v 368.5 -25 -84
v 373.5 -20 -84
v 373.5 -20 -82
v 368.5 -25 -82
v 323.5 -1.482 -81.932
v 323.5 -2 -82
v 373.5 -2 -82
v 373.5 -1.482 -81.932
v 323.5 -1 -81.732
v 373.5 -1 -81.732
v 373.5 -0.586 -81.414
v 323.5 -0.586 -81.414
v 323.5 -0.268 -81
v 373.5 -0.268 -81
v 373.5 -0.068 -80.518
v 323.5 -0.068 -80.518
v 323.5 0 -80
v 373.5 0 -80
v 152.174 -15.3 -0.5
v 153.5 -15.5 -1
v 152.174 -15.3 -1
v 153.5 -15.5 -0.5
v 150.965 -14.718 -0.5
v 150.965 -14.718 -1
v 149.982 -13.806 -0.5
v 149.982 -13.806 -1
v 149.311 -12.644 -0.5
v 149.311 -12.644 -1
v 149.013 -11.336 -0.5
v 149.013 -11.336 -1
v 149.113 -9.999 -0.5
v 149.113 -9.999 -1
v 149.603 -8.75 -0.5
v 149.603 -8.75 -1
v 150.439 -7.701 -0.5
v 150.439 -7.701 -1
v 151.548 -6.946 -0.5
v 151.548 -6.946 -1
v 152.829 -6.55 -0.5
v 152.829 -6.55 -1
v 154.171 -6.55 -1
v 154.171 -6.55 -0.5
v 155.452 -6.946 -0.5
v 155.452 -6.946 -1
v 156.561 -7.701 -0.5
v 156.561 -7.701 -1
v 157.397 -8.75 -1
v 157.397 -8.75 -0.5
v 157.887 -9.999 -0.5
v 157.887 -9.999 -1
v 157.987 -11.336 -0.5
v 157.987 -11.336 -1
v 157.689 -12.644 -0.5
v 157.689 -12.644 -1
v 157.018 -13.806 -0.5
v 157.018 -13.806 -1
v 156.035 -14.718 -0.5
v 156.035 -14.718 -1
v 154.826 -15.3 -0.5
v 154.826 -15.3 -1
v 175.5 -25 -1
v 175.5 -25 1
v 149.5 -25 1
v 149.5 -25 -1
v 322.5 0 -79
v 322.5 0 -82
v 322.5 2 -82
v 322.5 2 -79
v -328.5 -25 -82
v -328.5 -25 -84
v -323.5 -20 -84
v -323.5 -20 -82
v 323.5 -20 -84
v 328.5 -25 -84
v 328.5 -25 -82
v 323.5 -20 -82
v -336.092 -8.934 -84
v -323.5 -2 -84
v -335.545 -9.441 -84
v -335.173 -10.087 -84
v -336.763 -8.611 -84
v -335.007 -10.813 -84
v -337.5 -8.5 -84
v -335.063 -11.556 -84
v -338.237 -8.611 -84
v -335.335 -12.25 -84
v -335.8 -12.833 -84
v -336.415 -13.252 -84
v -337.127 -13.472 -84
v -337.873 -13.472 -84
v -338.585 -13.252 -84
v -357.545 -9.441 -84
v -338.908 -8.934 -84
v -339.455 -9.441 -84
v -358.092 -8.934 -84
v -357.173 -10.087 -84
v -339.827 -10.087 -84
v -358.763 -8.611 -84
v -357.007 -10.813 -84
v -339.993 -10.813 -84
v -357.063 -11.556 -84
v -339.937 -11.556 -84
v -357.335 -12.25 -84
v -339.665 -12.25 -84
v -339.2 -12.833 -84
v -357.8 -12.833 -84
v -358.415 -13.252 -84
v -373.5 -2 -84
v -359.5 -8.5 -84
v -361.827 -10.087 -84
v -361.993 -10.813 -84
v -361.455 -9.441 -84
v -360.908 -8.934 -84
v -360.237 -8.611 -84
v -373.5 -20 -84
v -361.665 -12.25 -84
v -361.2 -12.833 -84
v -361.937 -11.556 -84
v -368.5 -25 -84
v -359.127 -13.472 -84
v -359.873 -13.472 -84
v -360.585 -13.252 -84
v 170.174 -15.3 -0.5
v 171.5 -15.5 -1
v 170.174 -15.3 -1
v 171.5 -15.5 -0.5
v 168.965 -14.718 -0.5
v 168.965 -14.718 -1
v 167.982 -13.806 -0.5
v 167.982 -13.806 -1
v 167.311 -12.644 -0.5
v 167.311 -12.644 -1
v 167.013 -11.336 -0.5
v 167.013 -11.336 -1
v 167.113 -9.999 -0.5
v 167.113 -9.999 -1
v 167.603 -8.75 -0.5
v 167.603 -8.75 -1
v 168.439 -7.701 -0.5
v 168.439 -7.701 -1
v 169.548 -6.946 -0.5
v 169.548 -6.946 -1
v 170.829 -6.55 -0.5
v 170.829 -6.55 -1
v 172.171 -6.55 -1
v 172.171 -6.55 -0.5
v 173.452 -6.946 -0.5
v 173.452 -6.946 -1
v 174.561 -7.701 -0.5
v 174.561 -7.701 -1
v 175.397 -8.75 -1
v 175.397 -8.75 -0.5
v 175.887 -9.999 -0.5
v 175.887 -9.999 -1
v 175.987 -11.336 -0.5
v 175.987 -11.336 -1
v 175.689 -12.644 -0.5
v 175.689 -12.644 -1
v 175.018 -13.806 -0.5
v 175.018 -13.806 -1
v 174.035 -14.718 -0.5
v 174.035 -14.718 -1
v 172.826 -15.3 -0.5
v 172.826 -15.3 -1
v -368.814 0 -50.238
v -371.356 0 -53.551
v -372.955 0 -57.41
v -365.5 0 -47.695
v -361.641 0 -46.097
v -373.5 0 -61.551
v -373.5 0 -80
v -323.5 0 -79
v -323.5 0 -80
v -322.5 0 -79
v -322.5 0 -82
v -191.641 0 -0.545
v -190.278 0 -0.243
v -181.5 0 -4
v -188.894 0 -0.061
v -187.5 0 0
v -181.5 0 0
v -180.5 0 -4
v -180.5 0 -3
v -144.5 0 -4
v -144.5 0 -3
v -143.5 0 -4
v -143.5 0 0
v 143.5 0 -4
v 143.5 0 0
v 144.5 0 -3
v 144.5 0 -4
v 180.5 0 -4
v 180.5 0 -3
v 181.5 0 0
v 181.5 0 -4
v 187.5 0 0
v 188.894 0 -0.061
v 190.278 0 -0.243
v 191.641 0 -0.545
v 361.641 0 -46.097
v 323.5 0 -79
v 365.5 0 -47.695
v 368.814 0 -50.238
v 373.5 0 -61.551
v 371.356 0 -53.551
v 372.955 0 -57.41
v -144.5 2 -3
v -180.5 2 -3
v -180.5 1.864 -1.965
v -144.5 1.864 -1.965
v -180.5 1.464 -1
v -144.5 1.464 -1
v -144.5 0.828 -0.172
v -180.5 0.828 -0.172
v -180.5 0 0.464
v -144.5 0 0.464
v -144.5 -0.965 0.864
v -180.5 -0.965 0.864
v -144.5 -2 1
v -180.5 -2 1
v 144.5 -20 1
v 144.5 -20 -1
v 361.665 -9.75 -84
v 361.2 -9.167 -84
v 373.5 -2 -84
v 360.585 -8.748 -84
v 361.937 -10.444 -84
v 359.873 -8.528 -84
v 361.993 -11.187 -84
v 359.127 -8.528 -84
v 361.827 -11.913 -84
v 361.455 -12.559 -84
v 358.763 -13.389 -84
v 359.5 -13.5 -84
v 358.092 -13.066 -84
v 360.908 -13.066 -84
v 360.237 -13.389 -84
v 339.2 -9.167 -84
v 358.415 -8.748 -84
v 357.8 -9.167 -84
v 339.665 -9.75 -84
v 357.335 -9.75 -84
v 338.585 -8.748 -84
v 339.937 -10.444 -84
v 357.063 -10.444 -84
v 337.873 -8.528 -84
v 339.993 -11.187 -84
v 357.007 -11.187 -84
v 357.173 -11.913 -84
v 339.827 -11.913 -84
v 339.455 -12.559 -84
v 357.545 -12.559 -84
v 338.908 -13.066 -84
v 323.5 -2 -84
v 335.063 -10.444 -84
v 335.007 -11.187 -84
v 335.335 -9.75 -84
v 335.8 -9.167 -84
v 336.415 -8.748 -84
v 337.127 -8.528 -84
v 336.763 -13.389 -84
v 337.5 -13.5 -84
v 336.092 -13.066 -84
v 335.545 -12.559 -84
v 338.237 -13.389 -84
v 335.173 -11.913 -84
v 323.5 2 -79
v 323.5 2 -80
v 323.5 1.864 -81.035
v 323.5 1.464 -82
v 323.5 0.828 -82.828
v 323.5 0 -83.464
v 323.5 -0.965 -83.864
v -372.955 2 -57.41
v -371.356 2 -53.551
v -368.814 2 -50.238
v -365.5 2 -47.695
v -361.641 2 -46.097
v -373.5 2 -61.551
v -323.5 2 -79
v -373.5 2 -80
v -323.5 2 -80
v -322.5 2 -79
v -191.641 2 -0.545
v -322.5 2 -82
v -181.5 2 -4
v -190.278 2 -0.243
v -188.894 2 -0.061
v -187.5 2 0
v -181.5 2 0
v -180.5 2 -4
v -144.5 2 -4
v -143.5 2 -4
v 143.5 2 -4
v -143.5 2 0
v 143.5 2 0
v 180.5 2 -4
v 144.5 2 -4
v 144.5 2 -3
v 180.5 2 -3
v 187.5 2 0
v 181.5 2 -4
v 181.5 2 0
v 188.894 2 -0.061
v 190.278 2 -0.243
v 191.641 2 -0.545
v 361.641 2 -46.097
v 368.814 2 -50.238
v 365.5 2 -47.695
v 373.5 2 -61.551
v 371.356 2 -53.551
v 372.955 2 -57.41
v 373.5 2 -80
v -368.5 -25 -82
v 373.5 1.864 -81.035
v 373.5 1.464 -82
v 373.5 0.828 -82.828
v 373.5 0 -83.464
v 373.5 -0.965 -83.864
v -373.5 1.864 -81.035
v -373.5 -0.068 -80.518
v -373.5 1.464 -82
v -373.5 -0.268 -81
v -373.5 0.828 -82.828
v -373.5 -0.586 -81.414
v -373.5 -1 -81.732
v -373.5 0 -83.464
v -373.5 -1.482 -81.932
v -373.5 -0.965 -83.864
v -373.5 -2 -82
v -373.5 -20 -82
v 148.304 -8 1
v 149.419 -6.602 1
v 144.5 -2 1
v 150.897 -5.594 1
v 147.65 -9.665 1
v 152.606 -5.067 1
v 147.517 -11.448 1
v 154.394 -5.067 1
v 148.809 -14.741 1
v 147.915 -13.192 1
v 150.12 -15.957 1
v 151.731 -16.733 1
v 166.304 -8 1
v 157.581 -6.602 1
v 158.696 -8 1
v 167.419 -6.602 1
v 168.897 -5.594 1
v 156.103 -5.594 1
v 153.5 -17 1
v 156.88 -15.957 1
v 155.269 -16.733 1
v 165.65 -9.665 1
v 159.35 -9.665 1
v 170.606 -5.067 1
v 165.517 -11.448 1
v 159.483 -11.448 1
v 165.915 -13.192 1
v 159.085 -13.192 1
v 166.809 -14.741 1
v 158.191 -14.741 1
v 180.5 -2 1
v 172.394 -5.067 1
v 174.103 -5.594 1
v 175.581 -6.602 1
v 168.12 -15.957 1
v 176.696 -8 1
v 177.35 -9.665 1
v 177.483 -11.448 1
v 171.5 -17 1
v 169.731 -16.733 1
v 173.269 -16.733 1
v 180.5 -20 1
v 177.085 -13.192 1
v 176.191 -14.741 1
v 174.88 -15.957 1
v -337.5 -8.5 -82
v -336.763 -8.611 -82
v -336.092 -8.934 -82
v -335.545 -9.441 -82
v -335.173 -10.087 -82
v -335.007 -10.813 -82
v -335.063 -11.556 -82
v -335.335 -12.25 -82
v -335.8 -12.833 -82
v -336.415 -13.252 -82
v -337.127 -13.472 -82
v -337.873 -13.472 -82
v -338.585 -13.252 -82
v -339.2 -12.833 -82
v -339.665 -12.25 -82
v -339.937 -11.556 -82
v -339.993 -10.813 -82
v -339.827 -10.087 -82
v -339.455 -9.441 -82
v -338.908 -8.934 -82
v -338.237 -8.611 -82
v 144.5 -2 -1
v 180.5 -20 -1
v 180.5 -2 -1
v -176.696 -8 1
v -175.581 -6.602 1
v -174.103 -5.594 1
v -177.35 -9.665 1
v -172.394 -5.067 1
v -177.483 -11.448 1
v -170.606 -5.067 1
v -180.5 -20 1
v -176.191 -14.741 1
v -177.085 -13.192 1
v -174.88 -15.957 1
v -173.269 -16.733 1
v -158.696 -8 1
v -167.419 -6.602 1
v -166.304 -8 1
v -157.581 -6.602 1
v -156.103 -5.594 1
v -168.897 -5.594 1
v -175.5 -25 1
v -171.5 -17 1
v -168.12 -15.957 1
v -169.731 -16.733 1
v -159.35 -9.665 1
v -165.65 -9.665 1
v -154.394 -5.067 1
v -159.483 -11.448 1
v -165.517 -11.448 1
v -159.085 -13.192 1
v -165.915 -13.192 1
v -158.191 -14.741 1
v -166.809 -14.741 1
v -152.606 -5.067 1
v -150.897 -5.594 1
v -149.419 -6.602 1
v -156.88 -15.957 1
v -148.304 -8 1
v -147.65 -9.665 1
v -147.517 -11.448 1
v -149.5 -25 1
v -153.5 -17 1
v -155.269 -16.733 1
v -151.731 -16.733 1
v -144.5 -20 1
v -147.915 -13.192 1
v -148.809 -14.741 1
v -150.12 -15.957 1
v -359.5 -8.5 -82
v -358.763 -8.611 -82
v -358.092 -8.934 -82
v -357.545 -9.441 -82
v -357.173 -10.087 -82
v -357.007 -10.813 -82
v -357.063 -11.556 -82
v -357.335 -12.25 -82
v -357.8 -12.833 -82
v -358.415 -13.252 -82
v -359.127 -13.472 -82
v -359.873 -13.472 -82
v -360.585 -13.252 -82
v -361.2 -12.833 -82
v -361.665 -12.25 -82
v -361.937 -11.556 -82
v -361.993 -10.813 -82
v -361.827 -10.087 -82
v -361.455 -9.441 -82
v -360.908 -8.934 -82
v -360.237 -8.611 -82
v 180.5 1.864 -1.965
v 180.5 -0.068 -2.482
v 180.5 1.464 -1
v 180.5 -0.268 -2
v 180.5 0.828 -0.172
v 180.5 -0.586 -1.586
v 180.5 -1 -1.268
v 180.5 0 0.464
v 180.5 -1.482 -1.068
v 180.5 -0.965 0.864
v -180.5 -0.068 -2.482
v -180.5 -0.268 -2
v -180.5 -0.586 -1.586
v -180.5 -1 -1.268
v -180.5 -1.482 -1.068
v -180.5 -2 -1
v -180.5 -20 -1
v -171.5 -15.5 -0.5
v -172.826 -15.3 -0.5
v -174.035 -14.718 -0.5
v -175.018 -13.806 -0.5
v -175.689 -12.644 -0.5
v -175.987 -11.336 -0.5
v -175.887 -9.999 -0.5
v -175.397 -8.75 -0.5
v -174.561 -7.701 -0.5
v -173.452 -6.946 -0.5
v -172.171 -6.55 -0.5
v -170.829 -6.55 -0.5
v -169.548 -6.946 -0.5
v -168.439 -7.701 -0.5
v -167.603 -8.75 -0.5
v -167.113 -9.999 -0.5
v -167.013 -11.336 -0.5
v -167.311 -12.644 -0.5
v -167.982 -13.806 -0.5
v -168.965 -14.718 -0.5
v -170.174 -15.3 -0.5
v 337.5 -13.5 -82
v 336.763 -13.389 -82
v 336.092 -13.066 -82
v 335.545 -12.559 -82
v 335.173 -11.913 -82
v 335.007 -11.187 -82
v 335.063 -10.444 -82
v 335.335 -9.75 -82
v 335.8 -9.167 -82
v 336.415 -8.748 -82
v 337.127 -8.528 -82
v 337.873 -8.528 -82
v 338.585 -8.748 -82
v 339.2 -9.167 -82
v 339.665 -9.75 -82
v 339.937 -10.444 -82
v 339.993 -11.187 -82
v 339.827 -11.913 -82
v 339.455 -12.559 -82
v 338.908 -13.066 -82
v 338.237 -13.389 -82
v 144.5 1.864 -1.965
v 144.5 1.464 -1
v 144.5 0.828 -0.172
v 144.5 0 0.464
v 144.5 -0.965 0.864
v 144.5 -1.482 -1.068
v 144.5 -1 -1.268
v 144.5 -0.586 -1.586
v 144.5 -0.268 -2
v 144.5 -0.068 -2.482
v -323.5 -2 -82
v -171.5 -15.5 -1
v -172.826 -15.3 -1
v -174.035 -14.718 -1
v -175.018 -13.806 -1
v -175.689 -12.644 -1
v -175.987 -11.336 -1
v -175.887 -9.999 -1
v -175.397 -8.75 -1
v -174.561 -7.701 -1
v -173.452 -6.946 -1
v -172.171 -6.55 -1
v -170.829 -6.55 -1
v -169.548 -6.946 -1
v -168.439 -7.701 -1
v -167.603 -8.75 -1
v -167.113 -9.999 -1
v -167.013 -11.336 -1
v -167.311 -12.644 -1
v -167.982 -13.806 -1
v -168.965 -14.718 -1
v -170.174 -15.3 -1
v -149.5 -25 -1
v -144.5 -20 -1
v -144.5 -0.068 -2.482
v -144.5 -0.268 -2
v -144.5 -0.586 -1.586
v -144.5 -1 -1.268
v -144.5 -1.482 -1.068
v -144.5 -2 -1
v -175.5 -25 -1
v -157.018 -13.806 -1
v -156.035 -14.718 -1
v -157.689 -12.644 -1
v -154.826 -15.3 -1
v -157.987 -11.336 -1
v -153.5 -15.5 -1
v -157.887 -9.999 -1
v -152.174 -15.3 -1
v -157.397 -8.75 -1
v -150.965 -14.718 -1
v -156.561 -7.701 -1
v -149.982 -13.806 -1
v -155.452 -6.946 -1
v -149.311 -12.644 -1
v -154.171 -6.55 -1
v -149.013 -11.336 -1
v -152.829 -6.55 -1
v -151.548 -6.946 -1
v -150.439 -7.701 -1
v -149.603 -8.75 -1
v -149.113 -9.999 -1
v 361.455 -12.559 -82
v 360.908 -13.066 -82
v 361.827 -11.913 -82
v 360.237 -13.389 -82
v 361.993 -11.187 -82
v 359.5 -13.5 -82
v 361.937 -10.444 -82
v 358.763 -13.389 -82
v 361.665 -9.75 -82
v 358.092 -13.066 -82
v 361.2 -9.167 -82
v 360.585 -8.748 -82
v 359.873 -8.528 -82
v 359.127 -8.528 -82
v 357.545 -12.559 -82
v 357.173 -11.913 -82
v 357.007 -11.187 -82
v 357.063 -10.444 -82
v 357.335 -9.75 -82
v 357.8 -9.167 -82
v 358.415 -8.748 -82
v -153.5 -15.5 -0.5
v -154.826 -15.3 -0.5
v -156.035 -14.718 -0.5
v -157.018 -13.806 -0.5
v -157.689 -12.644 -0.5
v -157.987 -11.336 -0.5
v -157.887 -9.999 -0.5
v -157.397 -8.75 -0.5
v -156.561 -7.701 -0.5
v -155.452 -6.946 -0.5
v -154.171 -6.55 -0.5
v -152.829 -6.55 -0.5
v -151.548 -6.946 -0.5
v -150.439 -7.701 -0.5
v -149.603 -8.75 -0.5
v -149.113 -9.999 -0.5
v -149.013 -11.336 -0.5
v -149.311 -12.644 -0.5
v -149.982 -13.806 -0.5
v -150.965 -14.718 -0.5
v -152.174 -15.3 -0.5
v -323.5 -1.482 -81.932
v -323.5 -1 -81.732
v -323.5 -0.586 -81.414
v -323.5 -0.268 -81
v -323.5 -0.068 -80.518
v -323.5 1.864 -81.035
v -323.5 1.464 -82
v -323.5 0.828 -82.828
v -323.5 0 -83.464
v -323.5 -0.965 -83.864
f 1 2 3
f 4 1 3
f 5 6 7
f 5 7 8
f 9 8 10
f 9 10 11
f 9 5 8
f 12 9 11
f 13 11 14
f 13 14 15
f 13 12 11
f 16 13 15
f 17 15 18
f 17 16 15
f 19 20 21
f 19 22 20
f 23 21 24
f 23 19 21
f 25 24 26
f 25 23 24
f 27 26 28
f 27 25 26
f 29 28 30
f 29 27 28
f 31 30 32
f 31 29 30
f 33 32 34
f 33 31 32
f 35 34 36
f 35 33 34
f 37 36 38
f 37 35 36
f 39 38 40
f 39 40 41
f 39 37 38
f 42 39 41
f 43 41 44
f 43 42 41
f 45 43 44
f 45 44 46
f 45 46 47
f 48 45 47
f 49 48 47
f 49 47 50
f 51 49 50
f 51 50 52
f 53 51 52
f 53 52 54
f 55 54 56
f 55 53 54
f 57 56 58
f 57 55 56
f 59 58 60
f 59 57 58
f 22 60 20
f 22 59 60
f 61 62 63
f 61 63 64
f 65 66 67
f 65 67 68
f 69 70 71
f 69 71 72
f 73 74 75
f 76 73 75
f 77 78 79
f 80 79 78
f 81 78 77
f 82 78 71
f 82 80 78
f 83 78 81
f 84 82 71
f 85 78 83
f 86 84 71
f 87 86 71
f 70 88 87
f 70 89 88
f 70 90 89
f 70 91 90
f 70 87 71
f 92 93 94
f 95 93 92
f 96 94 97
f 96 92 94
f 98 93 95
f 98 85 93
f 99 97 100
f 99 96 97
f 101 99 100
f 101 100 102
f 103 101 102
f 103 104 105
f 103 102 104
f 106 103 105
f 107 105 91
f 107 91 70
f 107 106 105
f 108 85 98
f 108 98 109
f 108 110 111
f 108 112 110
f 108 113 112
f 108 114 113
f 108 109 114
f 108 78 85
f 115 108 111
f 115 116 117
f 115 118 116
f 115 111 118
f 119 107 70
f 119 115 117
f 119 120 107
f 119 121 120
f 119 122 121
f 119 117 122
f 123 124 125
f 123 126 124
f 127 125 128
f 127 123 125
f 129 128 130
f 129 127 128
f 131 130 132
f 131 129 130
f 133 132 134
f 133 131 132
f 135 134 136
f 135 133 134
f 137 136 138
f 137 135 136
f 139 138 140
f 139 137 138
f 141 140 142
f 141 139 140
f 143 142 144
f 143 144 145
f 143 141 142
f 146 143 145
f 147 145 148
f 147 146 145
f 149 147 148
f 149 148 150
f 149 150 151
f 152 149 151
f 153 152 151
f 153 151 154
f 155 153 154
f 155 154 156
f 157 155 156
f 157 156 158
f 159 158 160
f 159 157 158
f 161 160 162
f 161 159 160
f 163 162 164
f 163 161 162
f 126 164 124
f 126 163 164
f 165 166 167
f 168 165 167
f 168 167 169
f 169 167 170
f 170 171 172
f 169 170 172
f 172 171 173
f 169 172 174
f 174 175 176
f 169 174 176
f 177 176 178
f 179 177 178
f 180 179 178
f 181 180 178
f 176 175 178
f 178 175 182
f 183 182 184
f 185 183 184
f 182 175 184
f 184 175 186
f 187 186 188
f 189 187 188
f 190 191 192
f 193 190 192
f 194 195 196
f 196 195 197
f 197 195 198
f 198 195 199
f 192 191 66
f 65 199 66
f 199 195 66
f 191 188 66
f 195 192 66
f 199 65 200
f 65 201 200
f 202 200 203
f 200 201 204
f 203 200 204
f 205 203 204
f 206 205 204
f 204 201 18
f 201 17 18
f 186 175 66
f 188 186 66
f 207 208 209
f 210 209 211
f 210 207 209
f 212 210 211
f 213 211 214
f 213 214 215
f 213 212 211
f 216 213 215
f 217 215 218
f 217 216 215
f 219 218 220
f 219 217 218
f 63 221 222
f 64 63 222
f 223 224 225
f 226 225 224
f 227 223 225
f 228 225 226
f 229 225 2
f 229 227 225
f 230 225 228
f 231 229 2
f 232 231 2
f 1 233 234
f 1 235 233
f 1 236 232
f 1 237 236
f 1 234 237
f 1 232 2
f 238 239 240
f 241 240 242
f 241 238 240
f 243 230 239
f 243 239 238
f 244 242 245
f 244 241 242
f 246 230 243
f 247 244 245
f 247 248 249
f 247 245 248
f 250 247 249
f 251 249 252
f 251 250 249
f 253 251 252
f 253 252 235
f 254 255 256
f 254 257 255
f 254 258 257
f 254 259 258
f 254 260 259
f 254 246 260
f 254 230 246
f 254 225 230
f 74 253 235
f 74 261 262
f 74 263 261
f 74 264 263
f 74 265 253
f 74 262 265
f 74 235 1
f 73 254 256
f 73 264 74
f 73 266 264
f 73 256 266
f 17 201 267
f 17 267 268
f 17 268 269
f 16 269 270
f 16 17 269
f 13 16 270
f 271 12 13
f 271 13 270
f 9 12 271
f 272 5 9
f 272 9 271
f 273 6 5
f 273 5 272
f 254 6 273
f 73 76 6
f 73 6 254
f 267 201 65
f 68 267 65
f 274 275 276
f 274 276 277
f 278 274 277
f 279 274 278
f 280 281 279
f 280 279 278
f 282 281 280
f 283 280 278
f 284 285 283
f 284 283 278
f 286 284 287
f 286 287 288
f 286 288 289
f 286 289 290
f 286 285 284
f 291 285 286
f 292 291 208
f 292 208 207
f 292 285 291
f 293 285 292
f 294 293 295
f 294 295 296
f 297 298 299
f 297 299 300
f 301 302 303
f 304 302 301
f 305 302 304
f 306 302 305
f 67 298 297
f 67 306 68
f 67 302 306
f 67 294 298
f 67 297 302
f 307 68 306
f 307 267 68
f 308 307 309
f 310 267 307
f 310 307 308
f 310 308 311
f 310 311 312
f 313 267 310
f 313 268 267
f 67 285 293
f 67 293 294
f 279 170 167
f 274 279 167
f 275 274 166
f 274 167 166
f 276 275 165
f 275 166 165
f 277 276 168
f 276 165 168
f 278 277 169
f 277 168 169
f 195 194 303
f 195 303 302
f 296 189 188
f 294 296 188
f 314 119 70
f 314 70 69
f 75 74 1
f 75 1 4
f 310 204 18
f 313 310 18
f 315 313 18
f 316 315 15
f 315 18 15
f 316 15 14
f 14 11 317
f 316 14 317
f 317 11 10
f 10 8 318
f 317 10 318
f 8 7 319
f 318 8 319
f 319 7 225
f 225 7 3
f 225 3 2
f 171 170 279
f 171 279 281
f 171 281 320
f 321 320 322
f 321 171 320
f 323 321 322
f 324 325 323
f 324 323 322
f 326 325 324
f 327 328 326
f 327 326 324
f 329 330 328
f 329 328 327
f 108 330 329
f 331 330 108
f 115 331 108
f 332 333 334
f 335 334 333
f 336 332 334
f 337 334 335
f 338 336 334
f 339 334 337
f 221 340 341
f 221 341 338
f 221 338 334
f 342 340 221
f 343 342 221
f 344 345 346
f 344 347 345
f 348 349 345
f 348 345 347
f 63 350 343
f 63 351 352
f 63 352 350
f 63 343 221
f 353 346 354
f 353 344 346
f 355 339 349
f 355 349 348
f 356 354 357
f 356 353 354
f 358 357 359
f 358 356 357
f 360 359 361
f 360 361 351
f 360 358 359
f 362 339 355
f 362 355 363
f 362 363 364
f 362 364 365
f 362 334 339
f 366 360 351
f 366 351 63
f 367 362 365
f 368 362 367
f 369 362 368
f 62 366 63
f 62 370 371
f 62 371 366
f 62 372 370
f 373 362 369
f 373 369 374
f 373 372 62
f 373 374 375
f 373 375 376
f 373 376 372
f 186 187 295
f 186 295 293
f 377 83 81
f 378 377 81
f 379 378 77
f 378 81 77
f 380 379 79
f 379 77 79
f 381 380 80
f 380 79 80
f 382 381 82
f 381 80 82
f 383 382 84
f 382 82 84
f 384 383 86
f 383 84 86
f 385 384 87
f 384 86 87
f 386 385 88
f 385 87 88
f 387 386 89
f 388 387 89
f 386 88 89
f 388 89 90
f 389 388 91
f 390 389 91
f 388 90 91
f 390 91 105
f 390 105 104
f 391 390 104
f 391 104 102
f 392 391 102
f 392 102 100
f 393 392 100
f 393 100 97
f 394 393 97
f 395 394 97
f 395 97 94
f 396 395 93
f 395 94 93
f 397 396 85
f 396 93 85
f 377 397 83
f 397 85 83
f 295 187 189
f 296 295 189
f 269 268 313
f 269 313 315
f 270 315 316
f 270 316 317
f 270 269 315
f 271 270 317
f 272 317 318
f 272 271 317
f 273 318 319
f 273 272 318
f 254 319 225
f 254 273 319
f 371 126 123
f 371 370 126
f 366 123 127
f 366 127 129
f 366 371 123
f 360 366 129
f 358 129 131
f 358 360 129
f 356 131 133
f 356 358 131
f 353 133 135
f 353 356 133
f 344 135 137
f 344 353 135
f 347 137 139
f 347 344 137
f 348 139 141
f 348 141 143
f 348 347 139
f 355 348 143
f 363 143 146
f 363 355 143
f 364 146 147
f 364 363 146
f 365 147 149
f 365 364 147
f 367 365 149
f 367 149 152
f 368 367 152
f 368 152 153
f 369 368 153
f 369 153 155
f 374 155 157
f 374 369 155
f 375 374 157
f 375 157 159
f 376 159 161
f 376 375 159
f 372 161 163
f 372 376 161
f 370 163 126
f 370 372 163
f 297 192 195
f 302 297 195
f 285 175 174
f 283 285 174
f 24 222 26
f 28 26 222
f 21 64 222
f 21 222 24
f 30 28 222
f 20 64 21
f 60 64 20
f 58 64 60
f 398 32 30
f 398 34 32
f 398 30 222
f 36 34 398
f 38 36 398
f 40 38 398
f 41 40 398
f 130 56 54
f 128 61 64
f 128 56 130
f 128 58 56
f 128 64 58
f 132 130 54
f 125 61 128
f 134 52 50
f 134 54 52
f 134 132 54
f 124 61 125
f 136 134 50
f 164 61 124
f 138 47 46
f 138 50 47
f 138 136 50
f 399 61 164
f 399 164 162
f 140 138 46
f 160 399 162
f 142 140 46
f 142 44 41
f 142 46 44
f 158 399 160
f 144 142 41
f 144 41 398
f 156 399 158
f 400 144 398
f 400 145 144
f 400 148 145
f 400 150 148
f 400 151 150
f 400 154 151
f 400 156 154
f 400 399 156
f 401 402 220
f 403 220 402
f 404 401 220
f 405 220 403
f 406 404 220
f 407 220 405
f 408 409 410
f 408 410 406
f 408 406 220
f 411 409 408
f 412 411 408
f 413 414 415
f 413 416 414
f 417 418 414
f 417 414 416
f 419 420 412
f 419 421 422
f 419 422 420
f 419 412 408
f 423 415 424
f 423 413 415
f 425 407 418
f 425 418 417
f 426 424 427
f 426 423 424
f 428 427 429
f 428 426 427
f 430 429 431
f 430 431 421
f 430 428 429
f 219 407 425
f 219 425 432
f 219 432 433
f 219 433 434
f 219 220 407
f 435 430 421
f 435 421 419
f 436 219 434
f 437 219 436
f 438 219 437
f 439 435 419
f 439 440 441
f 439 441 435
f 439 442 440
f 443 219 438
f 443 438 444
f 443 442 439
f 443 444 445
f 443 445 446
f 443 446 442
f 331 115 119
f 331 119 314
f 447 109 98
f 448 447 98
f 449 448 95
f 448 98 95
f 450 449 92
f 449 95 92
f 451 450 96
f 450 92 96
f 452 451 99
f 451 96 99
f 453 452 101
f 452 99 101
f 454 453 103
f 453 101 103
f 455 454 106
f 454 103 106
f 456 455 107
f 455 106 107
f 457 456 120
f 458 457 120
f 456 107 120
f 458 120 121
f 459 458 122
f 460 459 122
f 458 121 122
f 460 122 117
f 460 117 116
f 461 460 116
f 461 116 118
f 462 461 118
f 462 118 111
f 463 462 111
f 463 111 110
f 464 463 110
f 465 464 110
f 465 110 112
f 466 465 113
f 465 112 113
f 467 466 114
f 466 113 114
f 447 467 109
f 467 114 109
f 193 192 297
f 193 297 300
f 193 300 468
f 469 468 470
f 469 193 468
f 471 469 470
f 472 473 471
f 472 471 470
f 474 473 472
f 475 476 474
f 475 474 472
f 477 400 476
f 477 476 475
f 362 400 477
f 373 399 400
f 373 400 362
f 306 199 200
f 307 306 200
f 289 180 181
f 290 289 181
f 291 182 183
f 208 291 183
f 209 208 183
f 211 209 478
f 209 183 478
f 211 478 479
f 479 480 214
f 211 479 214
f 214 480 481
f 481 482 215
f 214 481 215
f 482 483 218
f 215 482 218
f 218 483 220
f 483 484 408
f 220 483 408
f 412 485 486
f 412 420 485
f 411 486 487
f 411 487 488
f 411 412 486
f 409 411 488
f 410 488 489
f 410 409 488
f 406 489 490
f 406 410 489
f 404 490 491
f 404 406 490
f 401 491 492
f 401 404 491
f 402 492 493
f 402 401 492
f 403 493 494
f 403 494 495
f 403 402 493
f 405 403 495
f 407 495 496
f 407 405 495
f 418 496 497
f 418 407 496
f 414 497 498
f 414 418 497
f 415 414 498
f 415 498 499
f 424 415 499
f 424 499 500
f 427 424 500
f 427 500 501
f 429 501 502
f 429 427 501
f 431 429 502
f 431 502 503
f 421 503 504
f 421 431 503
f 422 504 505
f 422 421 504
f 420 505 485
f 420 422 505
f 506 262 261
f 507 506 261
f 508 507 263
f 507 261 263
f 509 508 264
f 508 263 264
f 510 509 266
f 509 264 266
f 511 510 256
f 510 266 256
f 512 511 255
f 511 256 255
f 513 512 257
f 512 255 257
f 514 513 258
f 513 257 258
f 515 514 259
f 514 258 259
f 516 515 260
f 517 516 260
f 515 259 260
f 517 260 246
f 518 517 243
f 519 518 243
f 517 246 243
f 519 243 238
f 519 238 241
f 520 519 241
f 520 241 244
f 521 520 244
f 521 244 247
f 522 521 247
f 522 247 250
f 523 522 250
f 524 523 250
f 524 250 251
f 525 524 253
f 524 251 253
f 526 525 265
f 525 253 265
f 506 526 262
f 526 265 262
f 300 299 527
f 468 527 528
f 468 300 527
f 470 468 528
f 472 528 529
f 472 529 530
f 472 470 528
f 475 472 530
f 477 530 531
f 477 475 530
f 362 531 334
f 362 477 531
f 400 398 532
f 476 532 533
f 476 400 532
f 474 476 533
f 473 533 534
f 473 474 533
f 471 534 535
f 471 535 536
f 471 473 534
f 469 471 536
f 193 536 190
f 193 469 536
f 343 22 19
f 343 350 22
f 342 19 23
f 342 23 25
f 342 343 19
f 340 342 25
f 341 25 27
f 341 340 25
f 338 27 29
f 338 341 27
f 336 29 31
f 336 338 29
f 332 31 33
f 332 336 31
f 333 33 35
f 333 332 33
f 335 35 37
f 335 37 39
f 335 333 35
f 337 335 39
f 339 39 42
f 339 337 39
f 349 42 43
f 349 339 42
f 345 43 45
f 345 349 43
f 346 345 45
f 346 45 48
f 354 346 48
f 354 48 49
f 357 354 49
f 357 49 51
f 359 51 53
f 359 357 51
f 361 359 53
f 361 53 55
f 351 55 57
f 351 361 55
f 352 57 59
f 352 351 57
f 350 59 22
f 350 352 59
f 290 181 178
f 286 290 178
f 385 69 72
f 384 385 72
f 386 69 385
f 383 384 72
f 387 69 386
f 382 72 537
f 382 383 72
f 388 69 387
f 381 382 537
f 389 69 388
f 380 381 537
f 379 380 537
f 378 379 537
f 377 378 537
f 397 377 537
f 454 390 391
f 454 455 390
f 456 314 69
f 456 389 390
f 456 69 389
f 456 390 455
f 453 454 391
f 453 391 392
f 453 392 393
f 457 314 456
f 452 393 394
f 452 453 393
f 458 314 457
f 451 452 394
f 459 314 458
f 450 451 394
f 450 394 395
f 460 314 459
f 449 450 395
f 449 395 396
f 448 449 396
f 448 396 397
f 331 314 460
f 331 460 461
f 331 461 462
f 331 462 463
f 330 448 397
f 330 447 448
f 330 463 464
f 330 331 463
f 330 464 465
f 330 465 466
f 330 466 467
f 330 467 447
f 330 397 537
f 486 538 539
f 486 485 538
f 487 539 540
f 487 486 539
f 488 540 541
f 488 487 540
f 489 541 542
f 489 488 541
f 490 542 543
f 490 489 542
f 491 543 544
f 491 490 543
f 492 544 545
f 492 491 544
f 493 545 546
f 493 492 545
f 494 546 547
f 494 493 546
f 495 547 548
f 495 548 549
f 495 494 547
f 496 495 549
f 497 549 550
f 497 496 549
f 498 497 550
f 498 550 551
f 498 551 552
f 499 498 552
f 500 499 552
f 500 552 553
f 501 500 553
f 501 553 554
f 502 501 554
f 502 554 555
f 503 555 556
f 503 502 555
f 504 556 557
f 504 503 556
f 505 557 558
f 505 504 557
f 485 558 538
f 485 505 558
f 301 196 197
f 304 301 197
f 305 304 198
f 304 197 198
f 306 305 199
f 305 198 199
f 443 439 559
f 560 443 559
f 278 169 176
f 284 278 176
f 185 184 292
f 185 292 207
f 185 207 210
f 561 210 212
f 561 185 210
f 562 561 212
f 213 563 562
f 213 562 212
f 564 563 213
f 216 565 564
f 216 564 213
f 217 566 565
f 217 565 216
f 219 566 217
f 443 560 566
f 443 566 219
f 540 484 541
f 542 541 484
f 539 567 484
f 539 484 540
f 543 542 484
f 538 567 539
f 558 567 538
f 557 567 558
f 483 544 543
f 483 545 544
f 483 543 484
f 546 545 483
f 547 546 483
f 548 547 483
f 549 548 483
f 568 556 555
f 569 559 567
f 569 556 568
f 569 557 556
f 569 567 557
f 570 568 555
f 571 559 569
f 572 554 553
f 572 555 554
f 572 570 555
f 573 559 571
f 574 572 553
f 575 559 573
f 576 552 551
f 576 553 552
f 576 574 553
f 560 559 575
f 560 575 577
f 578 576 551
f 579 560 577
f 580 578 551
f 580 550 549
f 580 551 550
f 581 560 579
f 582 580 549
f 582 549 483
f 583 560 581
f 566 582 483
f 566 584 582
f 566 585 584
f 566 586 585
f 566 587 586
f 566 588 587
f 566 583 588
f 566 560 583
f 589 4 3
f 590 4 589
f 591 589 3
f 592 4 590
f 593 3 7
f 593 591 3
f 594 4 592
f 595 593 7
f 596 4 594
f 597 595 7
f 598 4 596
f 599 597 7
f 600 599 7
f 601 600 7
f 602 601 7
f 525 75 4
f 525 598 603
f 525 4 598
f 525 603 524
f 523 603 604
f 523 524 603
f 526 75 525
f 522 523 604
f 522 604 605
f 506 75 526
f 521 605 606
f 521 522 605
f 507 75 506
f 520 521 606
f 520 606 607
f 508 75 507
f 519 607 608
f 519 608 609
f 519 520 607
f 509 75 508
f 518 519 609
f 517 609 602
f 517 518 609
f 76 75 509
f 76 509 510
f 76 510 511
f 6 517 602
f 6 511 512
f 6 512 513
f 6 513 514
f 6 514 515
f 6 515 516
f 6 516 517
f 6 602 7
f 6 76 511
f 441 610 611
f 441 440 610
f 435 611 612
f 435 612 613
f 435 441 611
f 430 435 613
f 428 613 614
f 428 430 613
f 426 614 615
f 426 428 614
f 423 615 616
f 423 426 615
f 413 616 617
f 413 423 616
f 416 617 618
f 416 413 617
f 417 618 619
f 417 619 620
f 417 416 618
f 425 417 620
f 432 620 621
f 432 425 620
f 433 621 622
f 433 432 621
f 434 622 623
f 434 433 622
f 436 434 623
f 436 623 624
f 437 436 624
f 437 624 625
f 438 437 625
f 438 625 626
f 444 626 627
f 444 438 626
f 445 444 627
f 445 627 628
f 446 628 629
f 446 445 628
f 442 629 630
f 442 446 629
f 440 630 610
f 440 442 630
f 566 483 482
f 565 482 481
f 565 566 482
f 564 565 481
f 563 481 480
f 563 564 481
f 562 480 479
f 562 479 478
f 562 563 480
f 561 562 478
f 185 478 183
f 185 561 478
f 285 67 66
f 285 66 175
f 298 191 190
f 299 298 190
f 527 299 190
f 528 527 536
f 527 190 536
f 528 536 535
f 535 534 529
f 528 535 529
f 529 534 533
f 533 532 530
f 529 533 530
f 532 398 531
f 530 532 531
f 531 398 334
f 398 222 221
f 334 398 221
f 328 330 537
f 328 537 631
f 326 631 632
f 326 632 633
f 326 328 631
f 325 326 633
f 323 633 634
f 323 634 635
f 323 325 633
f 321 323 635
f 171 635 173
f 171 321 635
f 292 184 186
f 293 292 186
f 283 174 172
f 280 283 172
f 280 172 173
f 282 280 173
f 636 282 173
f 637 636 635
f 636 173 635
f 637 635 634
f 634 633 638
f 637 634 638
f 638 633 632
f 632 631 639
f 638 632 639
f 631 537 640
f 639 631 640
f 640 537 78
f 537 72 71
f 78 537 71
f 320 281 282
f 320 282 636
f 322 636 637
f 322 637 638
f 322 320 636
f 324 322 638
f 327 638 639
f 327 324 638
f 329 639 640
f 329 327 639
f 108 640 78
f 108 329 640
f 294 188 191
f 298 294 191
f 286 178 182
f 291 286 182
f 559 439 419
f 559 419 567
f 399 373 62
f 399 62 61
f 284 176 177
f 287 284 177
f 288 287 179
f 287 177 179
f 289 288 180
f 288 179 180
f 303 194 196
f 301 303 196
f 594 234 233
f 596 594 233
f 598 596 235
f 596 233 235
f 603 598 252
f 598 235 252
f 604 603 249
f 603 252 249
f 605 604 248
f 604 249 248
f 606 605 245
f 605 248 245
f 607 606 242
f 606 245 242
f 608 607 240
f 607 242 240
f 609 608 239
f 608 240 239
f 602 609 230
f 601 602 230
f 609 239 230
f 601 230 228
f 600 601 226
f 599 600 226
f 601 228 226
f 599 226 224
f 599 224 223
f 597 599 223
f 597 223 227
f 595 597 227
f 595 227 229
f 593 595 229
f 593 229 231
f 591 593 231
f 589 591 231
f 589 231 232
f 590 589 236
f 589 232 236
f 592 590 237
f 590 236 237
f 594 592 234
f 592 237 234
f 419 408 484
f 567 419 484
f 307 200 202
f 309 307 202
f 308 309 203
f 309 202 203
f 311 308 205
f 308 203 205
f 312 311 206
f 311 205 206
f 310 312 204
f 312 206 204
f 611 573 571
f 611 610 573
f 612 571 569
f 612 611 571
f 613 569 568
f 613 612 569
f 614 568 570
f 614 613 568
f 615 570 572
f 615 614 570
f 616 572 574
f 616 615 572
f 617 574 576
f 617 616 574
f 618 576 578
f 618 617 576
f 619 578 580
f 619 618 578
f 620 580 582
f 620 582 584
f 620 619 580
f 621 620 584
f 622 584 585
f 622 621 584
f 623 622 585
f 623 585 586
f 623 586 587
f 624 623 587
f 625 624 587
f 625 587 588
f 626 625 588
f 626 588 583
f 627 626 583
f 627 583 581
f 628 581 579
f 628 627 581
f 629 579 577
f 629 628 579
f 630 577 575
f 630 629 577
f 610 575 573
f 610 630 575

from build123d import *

# Parameters (mm, degrees)
SM_BASE_FLANGE_1_DEPTH            = 2
SM_EDGE_FLANGE_1_STRIP_W          = 12
SM_EDGE_FLANGE_1_STRIP_H          = 2
SM_EDGE_FLANGE_1_STRIP_CUT_DEPTH  = 50
SM_EDGE_FLANGE_1_RELIEF_W         = 13
SM_EDGE_FLANGE_1_RELIEF_H         = 1
SM_EDGE_FLANGE_1_RELIEF_CUT_DEPTH = 2
SM_EDGE_FLANGE_1_DEPTH            = 50
SM_EDGE_FLANGE_2_STRIP_W          = 12
SM_EDGE_FLANGE_2_STRIP_H          = 2
SM_EDGE_FLANGE_2_STRIP_CUT_DEPTH  = 50
SM_EDGE_FLANGE_2_RELIEF_W         = 13
SM_EDGE_FLANGE_2_RELIEF_H         = 1
SM_EDGE_FLANGE_2_RELIEF_CUT_DEPTH = 2
SM_EDGE_FLANGE_2_DEPTH            = 50
SM_EDGE_FLANGE_3_STRIP_W          = 13
SM_EDGE_FLANGE_3_STRIP_H          = 2
SM_EDGE_FLANGE_3_STRIP_CUT_DEPTH  = 36
SM_EDGE_FLANGE_3_RELIEF_W         = 14
SM_EDGE_FLANGE_3_RELIEF_H         = 1
SM_EDGE_FLANGE_3_RELIEF_CUT_DEPTH = 2
SM_EDGE_FLANGE_3_DEPTH            = 36
SM_EDGE_FLANGE_4_STRIP_W          = 13
SM_EDGE_FLANGE_4_STRIP_H          = 2
SM_EDGE_FLANGE_4_STRIP_CUT_DEPTH  = 36
SM_EDGE_FLANGE_4_RELIEF_W         = 14
SM_EDGE_FLANGE_4_RELIEF_H         = 1
SM_EDGE_FLANGE_4_RELIEF_CUT_DEPTH = 2
SM_EDGE_FLANGE_4_DEPTH            = 36
CHAMFER_1_SIZE                    = 5
HOLE_WIZARD_M61_AT_2_COUNT        = 2
HOLE_WIZARD_M61_AT_2_PITCH        = 18
HOLE_WIZARD_M61_AT_3_COUNT        = 2
HOLE_WIZARD_M61_AT_3_PITCH        = 325
HOLE_WIZARD_M61_AT_4_COUNT        = 2
HOLE_WIZARD_M61_AT_4_PITCH        = 343
SKETCH_20_R                       = 2.5
CUT_EXTRUDE_1_DEPTH               = 2
SKETCH_21_W                       = 645
SKETCH_21_H                       = 2
CUT_EXTRUDE_2_DEPTH               = 2


# Sheet-metal steps are written as plain solids
with BuildPart() as part:
    # Sketch 1 → Базовая кромка1 (new body)
    with BuildSketch(Plane(origin=(0, 0, 0), x_dir=(1, 0, 0), z_dir=(0, 1, 0))):
        with BuildLine():
            Line((-187.5, 0), (187.5, 0))
            ThreePointArc((187.5, 0), (189.588419076, 0.136882218), (191.641104722, 0.545186779))
            Line((191.641104722, 0.545186779), (361.641104722, 46.096549493))
            ThreePointArc((361.641104722, 46.096549493), (370.193653445, 51.811179849), (373.5, 61.551362713))
            Line((373.5, 61.551362713), (373.5, 84))
            Line((373.5, 84), (0, 84))
            Line((0, 84), (-373.5, 84))
            Line((-373.5, 84), (-373.5, 61.551362713))
            ThreePointArc((-373.5, 61.551362713), (-370.193653445, 51.811179849), (-361.641104722, 46.096549493))
            Line((-361.641104722, 46.096549493), (-191.641104722, 0.545186779))
            ThreePointArc((-191.641104722, 0.545186779), (-189.588419076, 0.136882218), (-187.5, 0))
        make_face()
    extrude(amount=SM_BASE_FLANGE_1_DEPTH)

    # Ребро-кромка1 strip (across the edge) → Ребро-кромка1 strip cut (cut)
    with BuildSketch(Plane(origin=(323.5, 0, -84), x_dir=(0, 0, 1), z_dir=(1, 0, 0))):
        with Locations((-2, -1)):
            Rectangle(SM_EDGE_FLANGE_1_STRIP_W, SM_EDGE_FLANGE_1_STRIP_H)
    extrude(amount=SM_EDGE_FLANGE_1_STRIP_CUT_DEPTH, mode=Mode.SUBTRACT)

    # Ребро-кромка1 relief (on the sheet) → Ребро-кромка1 relief cut (cut)
    with BuildSketch(Plane(origin=(323.5, 0, -80), x_dir=(0, 0, 1), z_dir=(0, -1, 0))):
        with Locations((-5.5, 0.5)):
            Rectangle(SM_EDGE_FLANGE_1_RELIEF_W, SM_EDGE_FLANGE_1_RELIEF_H)
    extrude(amount=-SM_EDGE_FLANGE_1_RELIEF_CUT_DEPTH, mode=Mode.SUBTRACT)

    # Ребро-кромка1 section (across the edge) → Ребро-кромка1 (add)
    with BuildSketch(Plane(origin=(323.5, 0, -84), x_dir=(0, 0, 1), z_dir=(1, 0, 0))):
        with BuildLine():
            Line((0, 2), (0, 25))
            Line((0, 25), (2, 25))
            Line((2, 25), (2, 2))
            ThreePointArc((2, 2), (2.585786438, 0.585786438), (4, 0))
            Line((4, 0), (4, -2))
            ThreePointArc((4, -2), (1.171572875, -0.828427125), (0, 2))
        make_face()
    extrude(amount=SM_EDGE_FLANGE_1_DEPTH)

    # Ребро-кромка2 strip (across the edge) → Ребро-кромка2 strip cut (cut)
    with BuildSketch(Plane(origin=(-373.5, 0, -84), x_dir=(0, 0, 1), z_dir=(1, 0, 0))):
        with Locations((-2, -1)):
            Rectangle(SM_EDGE_FLANGE_2_STRIP_W, SM_EDGE_FLANGE_2_STRIP_H)
    extrude(amount=SM_EDGE_FLANGE_2_STRIP_CUT_DEPTH, mode=Mode.SUBTRACT)

    # Ребро-кромка2 relief (on the sheet) → Ребро-кромка2 relief cut (cut)
    with BuildSketch(Plane(origin=(-373.5, 0, -80), x_dir=(0, 0, 1), z_dir=(0, -1, 0))):
        with Locations((-5.5, -50.5)):
            Rectangle(SM_EDGE_FLANGE_2_RELIEF_W, SM_EDGE_FLANGE_2_RELIEF_H)
    extrude(amount=-SM_EDGE_FLANGE_2_RELIEF_CUT_DEPTH, mode=Mode.SUBTRACT)

    # Ребро-кромка2 section (across the edge) → Ребро-кромка2 (add)
    with BuildSketch(Plane(origin=(-373.5, 0, -84), x_dir=(0, 0, 1), z_dir=(1, 0, 0))):
        with BuildLine():
            Line((0, 2), (0, 25))
            Line((0, 25), (2, 25))
            Line((2, 25), (2, 2))
            ThreePointArc((2, 2), (2.585786438, 0.585786438), (4, 0))
            Line((4, 0), (4, -2))
            ThreePointArc((4, -2), (1.171572875, -0.828427125), (0, 2))
        make_face()
    extrude(amount=SM_EDGE_FLANGE_2_DEPTH)

    # Ребро-кромка3 strip (across the edge) → Ребро-кромка3 strip cut (cut)
    with BuildSketch(Plane(origin=(-144.5, 0, 1), x_dir=(0, 0, -1), z_dir=(-1, 0, 0))):
        with Locations((-2.5, -1)):
            Rectangle(SM_EDGE_FLANGE_3_STRIP_W, SM_EDGE_FLANGE_3_STRIP_H)
    extrude(amount=SM_EDGE_FLANGE_3_STRIP_CUT_DEPTH, mode=Mode.SUBTRACT)

    # Ребро-кромка3 relief (on the sheet) → Ребро-кромка3 relief cut (cut)
    with BuildSketch(Plane(origin=(-144.5, 0, -3), x_dir=(0, 0, -1), z_dir=(0, -1, 0))):
        with Locations((-6, 0.5)):
            Rectangle(SM_EDGE_FLANGE_3_RELIEF_W, SM_EDGE_FLANGE_3_RELIEF_H)
        with Locations((-6, -36.5)):
            Rectangle(SM_EDGE_FLANGE_3_RELIEF_W, SM_EDGE_FLANGE_3_RELIEF_H)
    extrude(amount=-SM_EDGE_FLANGE_3_RELIEF_CUT_DEPTH, mode=Mode.SUBTRACT)

    # Ребро-кромка3 section (across the edge) → Ребро-кромка3 (add)
    with BuildSketch(Plane(origin=(-144.5, 0, 1), x_dir=(0, 0, -1), z_dir=(-1, 0, 0))):
        with BuildLine():
            Line((0, 2), (0, 25))
            Line((0, 25), (2, 25))
            Line((2, 25), (2, 2))
            ThreePointArc((2, 2), (2.585786438, 0.585786438), (4, 0))
            Line((4, 0), (4, -2))
            ThreePointArc((4, -2), (1.171572875, -0.828427125), (0, 2))
        make_face()
    extrude(amount=SM_EDGE_FLANGE_3_DEPTH)

    # Ребро-кромка4 strip (across the edge) → Ребро-кромка4 strip cut (cut)
    with BuildSketch(Plane(origin=(180.5, 0, 1), x_dir=(0, 0, -1), z_dir=(-1, 0, 0))):
        with Locations((-2.5, -1)):
            Rectangle(SM_EDGE_FLANGE_4_STRIP_W, SM_EDGE_FLANGE_4_STRIP_H)
    extrude(amount=SM_EDGE_FLANGE_4_STRIP_CUT_DEPTH, mode=Mode.SUBTRACT)

    # Ребро-кромка4 relief (on the sheet) → Ребро-кромка4 relief cut (cut)
    with BuildSketch(Plane(origin=(180.5, 0, -3), x_dir=(0, 0, -1), z_dir=(0, -1, 0))):
        with Locations((-6, 0.5)):
            Rectangle(SM_EDGE_FLANGE_4_RELIEF_W, SM_EDGE_FLANGE_4_RELIEF_H)
        with Locations((-6, -36.5)):
            Rectangle(SM_EDGE_FLANGE_4_RELIEF_W, SM_EDGE_FLANGE_4_RELIEF_H)
    extrude(amount=-SM_EDGE_FLANGE_4_RELIEF_CUT_DEPTH, mode=Mode.SUBTRACT)

    # Ребро-кромка4 section (across the edge) → Ребро-кромка4 (add)
    with BuildSketch(Plane(origin=(180.5, 0, 1), x_dir=(0, 0, -1), z_dir=(-1, 0, 0))):
        with BuildLine():
            Line((0, 2), (0, 25))
            Line((0, 25), (2, 25))
            Line((2, 25), (2, 2))
            ThreePointArc((2, 2), (2.585786438, 0.585786438), (4, 0))
            Line((4, 0), (4, -2))
            ThreePointArc((4, -2), (1.171572875, -0.828427125), (0, 2))
        make_face()
    extrude(amount=SM_EDGE_FLANGE_4_DEPTH)

    # Фаска1
    chamfer_1_edges = [part.edges().sort_by_distance(p)[0] for p in [
        (-373.5, -25, -83),
        (-323.5, -25, -83),
        (-144.5, -25, 0),
        (-180.5, -25, 0),
        (180.5, -25, 0),
        (144.5, -25, 0),
        (323.5, -25, -83),
        (373.5, -25, -83),
    ]]
    chamfer(chamfer_1_edges, length=CHAMFER_1_SIZE)

    # Эскиз18 → Зенковка для винта с потайной головкой M61 (revolve, cut)
    with BuildSketch(Plane(origin=(-171.5, -11, 1), x_dir=(0, -1, 0), z_dir=(1, 0, 0))):
        Polygon((0, 0), (0, 2), (4.5, 2), (4.5, 1.5), (6, 0), align=None)
    hole_wizard_m61 = revolve(axis=Axis((-171.5, -11, 7.35), (0, 0, -1)), mode=Mode.SUBTRACT)

    # Зенковка для винта с потайной головкой M61 at 2: Зенковка для винта с потайной головкой M61 ×2
    with Locations(*[(i * HOLE_WIZARD_M61_AT_2_PITCH, 0, 0) for i in range(1, HOLE_WIZARD_M61_AT_2_COUNT)]):
        add(hole_wizard_m61, mode=Mode.SUBTRACT)

    # Зенковка для винта с потайной головкой M61 at 3: Зенковка для винта с потайной головкой M61 ×2
    with Locations(*[(i * HOLE_WIZARD_M61_AT_3_PITCH, 0, 0) for i in range(1, HOLE_WIZARD_M61_AT_3_COUNT)]):
        add(hole_wizard_m61, mode=Mode.SUBTRACT)

    # Зенковка для винта с потайной головкой M61 at 4: Зенковка для винта с потайной головкой M61 ×2
    with Locations(*[(i * HOLE_WIZARD_M61_AT_4_PITCH, 0, 0) for i in range(1, HOLE_WIZARD_M61_AT_4_COUNT)]):
        add(hole_wizard_m61, mode=Mode.SUBTRACT)

    # Эскиз20 → Вытянуть1 (cut)
    with BuildSketch(Plane(origin=(0, 0, -84), x_dir=(-1, 0, 0), z_dir=(0, 0, -1))):
        with Locations(Location((337.5, -11, 0), (0, 0, 90))):
            Circle(SKETCH_20_R)
        with Locations(Location((359.5, -11, 0), (0, 0, 90))):
            Circle(SKETCH_20_R)
        with Locations(Location((-359.5, -11, 0), (0, 0, 270))):
            Circle(SKETCH_20_R)
        with Locations(Location((-337.5, -11, 0), (0, 0, 270))):
            Circle(SKETCH_20_R)
    extrude(amount=-CUT_EXTRUDE_1_DEPTH, mode=Mode.SUBTRACT)

    # Эскиз21 → Вытянуть2 (cut)
    with BuildSketch(Plane(origin=(0, 0, -84), x_dir=(-1, 0, 0), z_dir=(0, 0, -1))):
        with Locations((0, 1)):
            Rectangle(SKETCH_21_W, SKETCH_21_H)
    extrude(amount=-CUT_EXTRUDE_2_DEPTH, mode=Mode.SUBTRACT)


solid = part.part
